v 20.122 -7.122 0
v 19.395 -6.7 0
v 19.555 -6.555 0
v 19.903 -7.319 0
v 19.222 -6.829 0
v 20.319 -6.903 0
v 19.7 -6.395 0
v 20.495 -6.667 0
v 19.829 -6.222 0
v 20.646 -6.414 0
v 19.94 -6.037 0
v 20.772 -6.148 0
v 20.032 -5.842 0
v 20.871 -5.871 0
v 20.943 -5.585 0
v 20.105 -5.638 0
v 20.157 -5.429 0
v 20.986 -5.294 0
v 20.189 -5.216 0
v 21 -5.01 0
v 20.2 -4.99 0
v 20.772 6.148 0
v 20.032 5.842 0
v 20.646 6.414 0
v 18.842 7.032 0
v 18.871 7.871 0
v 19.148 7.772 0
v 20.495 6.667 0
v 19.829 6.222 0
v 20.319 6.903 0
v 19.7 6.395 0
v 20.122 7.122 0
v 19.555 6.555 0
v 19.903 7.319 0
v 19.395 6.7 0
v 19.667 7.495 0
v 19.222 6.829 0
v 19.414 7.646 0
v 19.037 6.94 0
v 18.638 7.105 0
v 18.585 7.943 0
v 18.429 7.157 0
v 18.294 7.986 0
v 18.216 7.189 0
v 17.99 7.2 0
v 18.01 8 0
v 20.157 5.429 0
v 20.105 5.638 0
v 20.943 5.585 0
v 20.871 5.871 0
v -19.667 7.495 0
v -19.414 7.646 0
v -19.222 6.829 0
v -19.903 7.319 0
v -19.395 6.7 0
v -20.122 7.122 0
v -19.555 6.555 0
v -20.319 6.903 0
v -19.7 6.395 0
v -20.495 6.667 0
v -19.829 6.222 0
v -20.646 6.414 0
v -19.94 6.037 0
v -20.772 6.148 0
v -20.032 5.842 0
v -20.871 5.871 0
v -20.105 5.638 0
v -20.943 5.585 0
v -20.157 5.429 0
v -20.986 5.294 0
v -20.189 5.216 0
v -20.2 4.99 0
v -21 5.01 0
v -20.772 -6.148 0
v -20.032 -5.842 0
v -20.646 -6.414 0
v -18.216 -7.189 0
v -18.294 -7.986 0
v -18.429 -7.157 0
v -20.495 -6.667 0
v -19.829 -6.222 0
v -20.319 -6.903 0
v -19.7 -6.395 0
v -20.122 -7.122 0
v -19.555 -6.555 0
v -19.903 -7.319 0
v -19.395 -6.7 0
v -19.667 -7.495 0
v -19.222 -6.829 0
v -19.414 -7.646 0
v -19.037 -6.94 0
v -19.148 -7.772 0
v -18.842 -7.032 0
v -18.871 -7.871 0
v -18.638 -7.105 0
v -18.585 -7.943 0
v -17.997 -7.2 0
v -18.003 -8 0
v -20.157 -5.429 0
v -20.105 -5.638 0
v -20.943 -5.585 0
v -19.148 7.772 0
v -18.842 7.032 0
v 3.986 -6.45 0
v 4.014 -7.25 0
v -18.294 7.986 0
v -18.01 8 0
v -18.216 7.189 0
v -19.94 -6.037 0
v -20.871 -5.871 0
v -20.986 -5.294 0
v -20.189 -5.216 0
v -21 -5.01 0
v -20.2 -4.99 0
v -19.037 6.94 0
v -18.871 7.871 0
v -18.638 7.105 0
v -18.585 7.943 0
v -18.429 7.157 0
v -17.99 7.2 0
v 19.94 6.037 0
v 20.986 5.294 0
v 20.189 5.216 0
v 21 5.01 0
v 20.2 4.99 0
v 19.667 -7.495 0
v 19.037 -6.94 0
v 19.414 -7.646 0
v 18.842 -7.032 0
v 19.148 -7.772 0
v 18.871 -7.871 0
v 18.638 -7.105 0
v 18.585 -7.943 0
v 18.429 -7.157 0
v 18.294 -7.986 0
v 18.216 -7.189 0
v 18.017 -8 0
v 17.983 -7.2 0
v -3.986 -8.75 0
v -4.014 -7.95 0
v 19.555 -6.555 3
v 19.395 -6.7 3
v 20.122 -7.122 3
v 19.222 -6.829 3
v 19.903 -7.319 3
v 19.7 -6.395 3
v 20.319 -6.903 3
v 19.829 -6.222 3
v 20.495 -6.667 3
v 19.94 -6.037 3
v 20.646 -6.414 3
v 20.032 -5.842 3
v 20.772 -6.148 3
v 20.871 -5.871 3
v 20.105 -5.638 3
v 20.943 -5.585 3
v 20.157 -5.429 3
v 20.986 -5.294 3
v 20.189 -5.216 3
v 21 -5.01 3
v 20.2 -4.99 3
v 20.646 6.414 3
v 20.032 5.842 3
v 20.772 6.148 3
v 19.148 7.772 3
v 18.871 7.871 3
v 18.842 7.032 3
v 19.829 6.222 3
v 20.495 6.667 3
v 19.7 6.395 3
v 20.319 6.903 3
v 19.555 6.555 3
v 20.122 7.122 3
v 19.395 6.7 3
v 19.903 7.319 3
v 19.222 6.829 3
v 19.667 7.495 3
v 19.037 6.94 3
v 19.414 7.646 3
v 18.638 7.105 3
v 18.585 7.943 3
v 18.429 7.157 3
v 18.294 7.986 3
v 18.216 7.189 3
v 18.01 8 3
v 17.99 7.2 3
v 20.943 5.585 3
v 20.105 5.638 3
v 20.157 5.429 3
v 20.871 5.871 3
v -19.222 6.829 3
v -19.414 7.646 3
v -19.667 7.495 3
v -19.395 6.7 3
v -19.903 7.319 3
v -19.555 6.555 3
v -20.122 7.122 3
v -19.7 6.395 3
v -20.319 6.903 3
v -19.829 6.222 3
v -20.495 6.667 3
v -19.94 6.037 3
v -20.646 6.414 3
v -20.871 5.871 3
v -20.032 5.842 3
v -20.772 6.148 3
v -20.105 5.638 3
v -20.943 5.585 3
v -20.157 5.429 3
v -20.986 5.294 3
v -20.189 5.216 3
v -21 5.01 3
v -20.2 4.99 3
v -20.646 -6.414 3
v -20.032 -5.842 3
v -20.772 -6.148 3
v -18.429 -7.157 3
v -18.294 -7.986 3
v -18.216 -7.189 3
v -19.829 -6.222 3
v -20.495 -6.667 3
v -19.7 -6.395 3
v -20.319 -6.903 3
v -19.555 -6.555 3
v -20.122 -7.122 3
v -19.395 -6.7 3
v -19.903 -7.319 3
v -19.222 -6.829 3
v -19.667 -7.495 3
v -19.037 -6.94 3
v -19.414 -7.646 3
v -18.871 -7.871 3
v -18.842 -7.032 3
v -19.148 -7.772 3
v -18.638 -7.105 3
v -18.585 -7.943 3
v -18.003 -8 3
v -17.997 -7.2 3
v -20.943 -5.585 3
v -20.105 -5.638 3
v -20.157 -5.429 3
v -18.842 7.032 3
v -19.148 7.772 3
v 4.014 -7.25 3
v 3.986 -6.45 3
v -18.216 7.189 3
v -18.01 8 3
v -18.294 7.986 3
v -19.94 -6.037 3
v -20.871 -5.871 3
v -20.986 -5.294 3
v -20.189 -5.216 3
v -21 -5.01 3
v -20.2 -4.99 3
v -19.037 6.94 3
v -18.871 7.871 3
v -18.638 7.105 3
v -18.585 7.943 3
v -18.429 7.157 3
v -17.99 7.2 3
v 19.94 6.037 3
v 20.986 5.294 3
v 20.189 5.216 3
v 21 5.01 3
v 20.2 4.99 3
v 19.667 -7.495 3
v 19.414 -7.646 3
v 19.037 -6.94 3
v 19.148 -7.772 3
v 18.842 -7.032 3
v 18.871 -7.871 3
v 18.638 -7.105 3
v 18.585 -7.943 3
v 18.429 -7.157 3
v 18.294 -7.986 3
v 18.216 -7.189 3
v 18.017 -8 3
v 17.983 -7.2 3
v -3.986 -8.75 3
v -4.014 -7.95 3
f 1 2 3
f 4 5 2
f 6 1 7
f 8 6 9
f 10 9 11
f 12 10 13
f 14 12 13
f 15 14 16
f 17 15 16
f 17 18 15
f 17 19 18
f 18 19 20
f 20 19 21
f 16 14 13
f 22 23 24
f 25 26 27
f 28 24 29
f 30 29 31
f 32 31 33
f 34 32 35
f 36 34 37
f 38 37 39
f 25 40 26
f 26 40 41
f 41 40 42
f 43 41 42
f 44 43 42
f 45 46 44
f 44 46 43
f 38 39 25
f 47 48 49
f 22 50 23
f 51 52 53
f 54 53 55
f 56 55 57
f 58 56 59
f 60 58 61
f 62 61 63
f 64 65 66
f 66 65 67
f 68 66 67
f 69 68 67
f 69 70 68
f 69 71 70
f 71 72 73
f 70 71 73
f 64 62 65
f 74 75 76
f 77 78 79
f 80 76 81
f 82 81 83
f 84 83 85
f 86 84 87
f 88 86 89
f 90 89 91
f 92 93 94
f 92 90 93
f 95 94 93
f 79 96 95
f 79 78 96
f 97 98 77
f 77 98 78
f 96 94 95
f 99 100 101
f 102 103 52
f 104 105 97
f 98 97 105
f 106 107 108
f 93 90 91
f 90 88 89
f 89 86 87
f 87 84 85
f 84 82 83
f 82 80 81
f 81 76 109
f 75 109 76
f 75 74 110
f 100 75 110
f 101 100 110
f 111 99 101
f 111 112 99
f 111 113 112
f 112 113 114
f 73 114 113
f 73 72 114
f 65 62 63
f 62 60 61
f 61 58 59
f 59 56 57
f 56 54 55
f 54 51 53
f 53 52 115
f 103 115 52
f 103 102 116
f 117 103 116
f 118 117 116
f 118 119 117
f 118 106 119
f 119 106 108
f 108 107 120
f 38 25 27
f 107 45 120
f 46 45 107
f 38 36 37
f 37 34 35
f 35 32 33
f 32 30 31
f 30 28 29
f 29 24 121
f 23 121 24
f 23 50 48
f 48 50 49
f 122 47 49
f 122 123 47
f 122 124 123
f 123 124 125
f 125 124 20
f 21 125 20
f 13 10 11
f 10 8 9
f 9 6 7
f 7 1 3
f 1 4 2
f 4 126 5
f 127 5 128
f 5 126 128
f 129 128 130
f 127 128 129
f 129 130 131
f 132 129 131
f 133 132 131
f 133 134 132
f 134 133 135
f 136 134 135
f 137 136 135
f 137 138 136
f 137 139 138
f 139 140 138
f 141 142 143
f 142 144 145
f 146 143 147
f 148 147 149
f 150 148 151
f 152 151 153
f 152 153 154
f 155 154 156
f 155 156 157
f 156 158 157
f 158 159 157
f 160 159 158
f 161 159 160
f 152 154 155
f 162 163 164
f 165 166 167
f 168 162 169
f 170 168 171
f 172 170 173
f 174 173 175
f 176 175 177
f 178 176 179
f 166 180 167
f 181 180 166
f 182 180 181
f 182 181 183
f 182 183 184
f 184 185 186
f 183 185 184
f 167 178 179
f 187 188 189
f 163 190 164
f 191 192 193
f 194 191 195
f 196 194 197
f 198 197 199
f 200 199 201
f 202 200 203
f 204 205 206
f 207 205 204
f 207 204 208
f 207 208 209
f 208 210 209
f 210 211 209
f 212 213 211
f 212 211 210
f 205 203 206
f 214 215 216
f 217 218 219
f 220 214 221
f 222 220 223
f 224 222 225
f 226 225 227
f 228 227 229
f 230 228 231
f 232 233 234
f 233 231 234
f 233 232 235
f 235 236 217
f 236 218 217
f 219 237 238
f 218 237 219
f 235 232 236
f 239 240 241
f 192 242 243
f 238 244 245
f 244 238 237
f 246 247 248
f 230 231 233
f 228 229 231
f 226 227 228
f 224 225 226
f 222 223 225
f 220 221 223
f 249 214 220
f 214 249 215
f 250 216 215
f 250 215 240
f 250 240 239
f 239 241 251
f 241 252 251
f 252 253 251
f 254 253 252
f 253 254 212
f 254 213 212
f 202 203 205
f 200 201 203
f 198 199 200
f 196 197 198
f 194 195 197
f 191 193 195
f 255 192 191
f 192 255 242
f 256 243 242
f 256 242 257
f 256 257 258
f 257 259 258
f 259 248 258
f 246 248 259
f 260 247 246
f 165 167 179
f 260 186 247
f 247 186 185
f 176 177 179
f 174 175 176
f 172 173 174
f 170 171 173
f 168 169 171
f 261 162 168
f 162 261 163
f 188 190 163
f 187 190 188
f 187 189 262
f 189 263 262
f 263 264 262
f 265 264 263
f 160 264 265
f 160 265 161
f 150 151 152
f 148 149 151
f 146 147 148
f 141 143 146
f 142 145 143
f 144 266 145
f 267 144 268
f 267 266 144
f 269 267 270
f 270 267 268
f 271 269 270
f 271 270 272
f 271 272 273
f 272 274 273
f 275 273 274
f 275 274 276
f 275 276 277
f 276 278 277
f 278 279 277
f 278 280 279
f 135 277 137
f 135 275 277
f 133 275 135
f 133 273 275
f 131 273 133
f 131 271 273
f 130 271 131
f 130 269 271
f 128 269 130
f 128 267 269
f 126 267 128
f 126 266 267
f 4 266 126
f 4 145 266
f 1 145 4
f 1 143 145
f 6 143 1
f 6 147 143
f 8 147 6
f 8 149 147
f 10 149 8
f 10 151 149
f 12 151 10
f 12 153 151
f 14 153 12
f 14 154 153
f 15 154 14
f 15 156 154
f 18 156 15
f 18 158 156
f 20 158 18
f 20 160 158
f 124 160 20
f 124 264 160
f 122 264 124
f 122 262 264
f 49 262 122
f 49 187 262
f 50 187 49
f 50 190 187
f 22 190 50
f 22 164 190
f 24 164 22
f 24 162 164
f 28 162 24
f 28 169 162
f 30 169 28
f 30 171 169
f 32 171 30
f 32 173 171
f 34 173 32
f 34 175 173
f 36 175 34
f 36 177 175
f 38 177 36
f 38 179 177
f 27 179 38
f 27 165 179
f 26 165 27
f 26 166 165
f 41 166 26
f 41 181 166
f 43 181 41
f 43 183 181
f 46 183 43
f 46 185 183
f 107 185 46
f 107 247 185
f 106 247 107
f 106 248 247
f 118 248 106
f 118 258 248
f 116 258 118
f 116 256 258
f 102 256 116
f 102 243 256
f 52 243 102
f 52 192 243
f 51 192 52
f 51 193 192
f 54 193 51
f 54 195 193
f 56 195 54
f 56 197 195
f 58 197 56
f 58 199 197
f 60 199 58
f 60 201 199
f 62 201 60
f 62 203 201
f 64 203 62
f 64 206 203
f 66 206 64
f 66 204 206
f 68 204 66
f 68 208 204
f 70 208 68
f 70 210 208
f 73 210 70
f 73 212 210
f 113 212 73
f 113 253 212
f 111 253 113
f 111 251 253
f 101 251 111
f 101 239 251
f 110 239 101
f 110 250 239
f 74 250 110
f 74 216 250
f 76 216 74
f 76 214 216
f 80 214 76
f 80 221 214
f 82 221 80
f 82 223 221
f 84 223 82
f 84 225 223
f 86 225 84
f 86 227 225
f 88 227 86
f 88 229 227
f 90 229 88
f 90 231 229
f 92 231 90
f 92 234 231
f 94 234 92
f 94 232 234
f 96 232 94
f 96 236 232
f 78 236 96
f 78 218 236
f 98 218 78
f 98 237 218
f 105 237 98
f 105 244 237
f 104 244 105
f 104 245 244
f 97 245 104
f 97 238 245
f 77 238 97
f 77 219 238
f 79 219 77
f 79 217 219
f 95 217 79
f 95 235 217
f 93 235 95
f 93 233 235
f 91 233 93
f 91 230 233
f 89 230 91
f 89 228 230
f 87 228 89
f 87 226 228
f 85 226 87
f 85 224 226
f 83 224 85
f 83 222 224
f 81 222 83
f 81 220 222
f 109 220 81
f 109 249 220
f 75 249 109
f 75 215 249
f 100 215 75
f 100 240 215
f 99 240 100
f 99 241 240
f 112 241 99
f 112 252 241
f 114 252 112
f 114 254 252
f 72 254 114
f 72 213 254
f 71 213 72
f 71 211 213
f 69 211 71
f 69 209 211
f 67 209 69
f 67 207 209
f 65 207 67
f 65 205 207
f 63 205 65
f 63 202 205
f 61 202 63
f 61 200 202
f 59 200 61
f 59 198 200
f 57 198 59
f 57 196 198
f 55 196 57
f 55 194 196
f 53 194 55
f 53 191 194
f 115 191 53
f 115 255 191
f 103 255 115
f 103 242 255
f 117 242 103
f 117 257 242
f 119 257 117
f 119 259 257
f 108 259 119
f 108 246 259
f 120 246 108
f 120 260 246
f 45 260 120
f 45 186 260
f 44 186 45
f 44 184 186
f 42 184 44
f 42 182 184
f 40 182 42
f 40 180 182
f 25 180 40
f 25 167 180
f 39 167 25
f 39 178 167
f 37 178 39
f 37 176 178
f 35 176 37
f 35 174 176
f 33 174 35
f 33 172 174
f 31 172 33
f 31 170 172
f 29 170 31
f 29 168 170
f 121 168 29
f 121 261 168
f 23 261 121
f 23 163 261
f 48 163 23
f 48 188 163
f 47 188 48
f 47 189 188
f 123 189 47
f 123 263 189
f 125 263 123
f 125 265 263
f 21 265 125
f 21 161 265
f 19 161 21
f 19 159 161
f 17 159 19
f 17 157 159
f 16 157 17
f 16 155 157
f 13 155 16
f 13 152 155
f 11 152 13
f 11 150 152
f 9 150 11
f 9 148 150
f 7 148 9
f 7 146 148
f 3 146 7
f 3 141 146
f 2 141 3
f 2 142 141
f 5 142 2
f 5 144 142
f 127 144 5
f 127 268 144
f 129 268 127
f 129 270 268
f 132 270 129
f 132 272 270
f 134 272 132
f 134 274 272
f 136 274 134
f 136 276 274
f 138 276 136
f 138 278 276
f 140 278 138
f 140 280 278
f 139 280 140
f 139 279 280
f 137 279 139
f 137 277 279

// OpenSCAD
// Rounded open wall with two opposite-bent overlapping long-side halves

L = 42;          // outside length
W = 16;          // outside width
H = 3;           // height
T = 0.8;         // wall thickness

corner_r = 3;    // outside corner radius
bend = 0.75;      // bend amount: one half outward, the other inward
overlap = 8;   // how much the two free halves overlap along the length

corner_steps = 16;

linear_extrude(H)
    stroke_path(make_path(), T);


// ---------- shape path ----------

function make_path() =
    let(
        hw = T / 2,
        x  = L/2 - hw,
        y  = W/2 - hw,
        r  = corner_r - hw,

        // Positive overlap means the two free ends pass each other.
        // Bottom side:
        //   outward = negative Y
        //   inward  = positive Y
        left_free_end  = [ overlap/2, -y + bend ],  // bent inward
        right_free_end = [-overlap/2, -y - bend ],  // bent outward

        bl = [-x+r, -y+r],
        tl = [-x+r,  y-r],
        tr = [ x-r,  y-r],
        br = [ x-r, -y+r]
    )
    concat(
        // start at free end of left lower half, bent inward
        [left_free_end, [-x+r, -y]],

        // bottom-left rounded corner
        arc(bl, r, -90, -180, corner_steps, 1),

        // left side
        [[-x, y-r]],

        // top-left rounded corner
        arc(tl, r, 180, 90, corner_steps, 1),

        // top long side
        [[x-r, y]],

        // top-right rounded corner
        arc(tr, r, 90, 0, corner_steps, 1),

        // right side
        [[x, -y+r]],

        // bottom-right rounded corner
        arc(br, r, 0, -90, corner_steps, 1),

        // end at free end of right lower half, bent outward
        [right_free_end]
    );


// ---------- helper geometry ----------

function arc(c, r, a1, a2, steps, skip=0) =
    [
        for (i = [skip:steps])
            let(a = a1 + (a2-a1) * i / steps)
                [c[0] + r*cos(a), c[1] + r*sin(a)]
    ];


// Creates a constant-width open wall around a centerline.
// Uses mitred/straight joins, not rounded joins.
module stroke_path(p, width) {
    hw = width / 2;
    n = len(p);

    left_pts = [
        for (i = [0:n-1])
            offset_point(p, i, hw)
    ];

    right_pts = [
        for (i = [n-1:-1:0])
            offset_point(p, i, -hw)
    ];

    polygon(concat(left_pts, right_pts));
}

function offset_point(p, i, d) =
    let(n = len(p))
    i == 0
        ? p[i] + normal(unit(p[1] - p[0])) * d
    : i == n-1
        ? p[i] + normal(unit(p[i] - p[i-1])) * d
    : miter_point(p[i-1], p[i], p[i+1], d);

function miter_point(a, b, c, d) =
    let(
        v1 = unit(b - a),
        v2 = unit(c - b),
        n1 = normal(v1),
        n2 = normal(v2),
        m  = unit(n1 + n2),
        q  = d / max(0.0001, m * n2)
    )
    b + m * q;

function normal(v) = [-v[1], v[0]];

function unit(v) =
    let(l = norm(v))
    l == 0 ? [0,0] : v / l;
